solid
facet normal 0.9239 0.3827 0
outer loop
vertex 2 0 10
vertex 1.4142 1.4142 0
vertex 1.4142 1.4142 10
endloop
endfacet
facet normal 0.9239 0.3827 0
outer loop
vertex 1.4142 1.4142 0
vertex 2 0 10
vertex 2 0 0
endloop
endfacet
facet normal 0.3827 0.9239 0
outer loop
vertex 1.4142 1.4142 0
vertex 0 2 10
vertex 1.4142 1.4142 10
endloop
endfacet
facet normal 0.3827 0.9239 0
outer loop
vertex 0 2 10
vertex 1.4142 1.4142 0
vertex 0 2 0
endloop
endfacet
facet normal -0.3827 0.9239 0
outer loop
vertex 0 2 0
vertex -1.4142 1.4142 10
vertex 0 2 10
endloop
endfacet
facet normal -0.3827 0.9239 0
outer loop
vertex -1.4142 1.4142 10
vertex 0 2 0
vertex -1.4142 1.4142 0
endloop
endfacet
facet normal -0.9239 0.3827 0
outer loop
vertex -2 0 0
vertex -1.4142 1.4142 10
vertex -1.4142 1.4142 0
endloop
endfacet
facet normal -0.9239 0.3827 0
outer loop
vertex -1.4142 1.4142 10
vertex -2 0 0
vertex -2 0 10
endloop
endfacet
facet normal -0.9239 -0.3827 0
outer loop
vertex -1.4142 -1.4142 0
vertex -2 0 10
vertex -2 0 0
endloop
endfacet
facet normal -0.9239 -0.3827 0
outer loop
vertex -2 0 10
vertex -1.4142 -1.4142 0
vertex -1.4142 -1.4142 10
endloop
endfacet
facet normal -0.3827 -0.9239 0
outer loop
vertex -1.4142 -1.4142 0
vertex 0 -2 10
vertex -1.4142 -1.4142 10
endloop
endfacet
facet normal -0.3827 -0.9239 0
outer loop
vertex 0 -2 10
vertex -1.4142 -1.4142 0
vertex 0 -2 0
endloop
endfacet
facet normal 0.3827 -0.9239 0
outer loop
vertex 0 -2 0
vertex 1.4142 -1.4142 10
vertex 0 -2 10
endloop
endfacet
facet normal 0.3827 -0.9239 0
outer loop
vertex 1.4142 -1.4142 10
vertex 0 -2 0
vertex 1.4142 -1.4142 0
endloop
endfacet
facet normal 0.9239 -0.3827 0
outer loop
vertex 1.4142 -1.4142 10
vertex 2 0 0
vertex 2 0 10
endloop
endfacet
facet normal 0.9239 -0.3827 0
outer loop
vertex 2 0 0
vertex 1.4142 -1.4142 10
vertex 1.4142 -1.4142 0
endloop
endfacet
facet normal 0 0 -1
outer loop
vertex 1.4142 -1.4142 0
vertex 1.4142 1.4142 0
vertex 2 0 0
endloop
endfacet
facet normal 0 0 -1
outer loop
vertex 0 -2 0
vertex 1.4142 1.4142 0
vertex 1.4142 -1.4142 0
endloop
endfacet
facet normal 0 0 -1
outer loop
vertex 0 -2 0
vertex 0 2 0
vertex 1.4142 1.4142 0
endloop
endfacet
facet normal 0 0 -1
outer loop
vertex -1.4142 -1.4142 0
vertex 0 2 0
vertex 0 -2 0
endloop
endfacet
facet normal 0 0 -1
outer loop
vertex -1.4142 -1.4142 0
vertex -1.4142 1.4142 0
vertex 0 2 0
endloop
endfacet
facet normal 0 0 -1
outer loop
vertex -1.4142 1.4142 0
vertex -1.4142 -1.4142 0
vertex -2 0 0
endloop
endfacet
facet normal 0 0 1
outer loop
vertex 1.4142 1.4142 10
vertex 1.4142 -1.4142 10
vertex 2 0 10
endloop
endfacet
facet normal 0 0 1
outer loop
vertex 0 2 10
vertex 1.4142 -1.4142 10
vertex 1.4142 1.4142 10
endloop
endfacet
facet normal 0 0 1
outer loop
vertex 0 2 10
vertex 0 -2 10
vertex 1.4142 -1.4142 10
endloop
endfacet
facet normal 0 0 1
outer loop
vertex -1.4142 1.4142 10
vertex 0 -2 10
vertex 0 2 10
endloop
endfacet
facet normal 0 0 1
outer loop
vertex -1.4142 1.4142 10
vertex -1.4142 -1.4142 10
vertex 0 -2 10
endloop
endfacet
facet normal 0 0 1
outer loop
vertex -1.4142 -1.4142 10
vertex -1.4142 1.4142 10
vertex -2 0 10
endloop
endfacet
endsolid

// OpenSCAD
include <involute_gears.scad>

hr = 3;
dh = 6;
give = .2;

cylinder(r=2,h=10, $fn=8);
gear(number_of_teeth=8,diametral_pitch=1, pressure_angle=30, flat=true);


translate([8+give,0,0]){
rotate([0,0,22])
gear(number_of_teeth=8,diametral_pitch=1, pressure_angle=30, flat=true);
cylinder(r=2, h=10, $fn=16);
}

//plate(3,2);
